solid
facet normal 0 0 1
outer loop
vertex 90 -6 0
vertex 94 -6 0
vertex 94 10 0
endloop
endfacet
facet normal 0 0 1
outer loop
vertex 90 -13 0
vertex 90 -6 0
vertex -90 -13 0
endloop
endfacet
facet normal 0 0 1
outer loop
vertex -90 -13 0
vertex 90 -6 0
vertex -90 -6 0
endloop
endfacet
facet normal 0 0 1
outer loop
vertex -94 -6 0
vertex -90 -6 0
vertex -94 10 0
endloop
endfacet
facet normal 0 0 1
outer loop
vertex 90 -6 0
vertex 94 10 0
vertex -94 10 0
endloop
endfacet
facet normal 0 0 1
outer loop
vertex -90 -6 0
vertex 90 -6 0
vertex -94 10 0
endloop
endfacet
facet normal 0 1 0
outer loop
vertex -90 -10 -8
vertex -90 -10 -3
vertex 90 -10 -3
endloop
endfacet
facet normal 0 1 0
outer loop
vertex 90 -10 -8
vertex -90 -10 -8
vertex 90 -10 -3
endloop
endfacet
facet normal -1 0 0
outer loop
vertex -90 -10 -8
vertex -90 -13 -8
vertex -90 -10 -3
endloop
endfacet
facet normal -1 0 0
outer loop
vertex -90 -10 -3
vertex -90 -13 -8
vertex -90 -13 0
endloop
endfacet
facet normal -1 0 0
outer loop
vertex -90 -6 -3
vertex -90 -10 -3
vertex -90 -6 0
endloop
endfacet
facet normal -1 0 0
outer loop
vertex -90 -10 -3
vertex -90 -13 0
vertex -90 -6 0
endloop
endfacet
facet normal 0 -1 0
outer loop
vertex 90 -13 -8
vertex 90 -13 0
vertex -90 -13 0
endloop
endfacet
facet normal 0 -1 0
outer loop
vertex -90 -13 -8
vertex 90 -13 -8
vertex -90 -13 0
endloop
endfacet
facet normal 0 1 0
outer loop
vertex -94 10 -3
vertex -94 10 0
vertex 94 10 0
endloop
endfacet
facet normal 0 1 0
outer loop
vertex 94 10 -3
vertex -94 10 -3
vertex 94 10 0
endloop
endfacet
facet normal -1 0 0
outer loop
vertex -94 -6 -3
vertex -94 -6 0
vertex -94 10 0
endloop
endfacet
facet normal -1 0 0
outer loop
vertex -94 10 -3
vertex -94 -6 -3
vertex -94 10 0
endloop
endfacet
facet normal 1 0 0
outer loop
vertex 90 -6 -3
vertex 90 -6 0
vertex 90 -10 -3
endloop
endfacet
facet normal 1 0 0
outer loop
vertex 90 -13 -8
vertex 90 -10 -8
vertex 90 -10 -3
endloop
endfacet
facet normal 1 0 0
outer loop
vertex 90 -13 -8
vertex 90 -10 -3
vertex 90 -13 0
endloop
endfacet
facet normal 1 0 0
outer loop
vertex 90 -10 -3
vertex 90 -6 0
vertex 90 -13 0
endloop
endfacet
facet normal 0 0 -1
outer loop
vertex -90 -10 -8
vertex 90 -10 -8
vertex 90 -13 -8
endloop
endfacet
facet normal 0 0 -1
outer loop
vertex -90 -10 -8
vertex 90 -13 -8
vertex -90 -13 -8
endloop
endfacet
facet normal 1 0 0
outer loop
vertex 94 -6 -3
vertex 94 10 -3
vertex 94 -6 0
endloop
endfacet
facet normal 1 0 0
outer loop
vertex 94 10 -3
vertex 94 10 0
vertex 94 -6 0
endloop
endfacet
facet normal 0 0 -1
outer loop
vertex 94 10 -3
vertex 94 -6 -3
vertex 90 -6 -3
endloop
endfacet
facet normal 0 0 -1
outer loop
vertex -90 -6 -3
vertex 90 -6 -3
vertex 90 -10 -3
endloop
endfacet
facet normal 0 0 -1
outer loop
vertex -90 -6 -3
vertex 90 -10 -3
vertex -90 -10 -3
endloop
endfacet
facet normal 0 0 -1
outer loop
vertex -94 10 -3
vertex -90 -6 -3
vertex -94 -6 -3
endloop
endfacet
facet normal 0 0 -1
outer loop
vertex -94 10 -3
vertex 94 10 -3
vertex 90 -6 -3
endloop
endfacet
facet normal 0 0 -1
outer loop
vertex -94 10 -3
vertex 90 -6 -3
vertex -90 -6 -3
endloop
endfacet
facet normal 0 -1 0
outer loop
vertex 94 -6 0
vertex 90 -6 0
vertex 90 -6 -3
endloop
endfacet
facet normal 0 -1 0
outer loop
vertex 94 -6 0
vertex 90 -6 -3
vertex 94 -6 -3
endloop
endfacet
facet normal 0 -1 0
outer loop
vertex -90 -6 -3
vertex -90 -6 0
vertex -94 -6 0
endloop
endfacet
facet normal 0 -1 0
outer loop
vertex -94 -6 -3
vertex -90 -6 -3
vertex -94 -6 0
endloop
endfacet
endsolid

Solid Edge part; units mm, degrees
sketch "Sketch1" plane through (0, 0, 0) normal (0, 0, 1) x (1, 0, 0)
  line L0 (94, 10) -> (94, -10)
  line L1 (94, -10) -> (-94, -10)
  line L2 (-94, -10) -> (-94, 10)
  line L3 (-94, 10) -> (94, 10)
extrude "Protrusion1" add sketch "Sketch1" against normal blind 3
sketch "Sketch2" plane through (0, 0, 0) normal (0, 0, 1) x (1, 0, 0)
  line L0 (90, -13) -> (-90, -13)
  line L1 (-90, -13) -> (-90, -10)
  line L2 (-90, -10) -> (90, -10)
  line L3 (90, -10) -> (90, -13)
extrude "Protrusão_Extrudada_2" add sketch "Sketch2" against normal blind 8
sketch "Sketch3" plane through (0, -1.5, 0) normal (0, 0, 1) x (1, 0, 0)
  line L0 (90, -4.5) -> (94, -4.5)
  line L1 (94, -4.5) -> (94, -8.5)
  line L2 (94, -8.5) -> (90, -8.5)
  line L3 (90, -8.5) -> (90, -4.5)
  line L4 (-94, -8.5) -> (-90, -8.5)
  line L5 (-90, -8.5) -> (-90, -4.5)
  line L6 (-90, -4.5) -> (-94, -4.5)
  line L7 (-94, -4.5) -> (-94, -8.5)
  dimension "D1" = 4
  dimension "D2" = 4
  dimension "D3" = 4
  dimension "D4" = 4
extrude "Recorte_Extrudado_1" cut sketch "Sketch3" against normal blind 53.6894
